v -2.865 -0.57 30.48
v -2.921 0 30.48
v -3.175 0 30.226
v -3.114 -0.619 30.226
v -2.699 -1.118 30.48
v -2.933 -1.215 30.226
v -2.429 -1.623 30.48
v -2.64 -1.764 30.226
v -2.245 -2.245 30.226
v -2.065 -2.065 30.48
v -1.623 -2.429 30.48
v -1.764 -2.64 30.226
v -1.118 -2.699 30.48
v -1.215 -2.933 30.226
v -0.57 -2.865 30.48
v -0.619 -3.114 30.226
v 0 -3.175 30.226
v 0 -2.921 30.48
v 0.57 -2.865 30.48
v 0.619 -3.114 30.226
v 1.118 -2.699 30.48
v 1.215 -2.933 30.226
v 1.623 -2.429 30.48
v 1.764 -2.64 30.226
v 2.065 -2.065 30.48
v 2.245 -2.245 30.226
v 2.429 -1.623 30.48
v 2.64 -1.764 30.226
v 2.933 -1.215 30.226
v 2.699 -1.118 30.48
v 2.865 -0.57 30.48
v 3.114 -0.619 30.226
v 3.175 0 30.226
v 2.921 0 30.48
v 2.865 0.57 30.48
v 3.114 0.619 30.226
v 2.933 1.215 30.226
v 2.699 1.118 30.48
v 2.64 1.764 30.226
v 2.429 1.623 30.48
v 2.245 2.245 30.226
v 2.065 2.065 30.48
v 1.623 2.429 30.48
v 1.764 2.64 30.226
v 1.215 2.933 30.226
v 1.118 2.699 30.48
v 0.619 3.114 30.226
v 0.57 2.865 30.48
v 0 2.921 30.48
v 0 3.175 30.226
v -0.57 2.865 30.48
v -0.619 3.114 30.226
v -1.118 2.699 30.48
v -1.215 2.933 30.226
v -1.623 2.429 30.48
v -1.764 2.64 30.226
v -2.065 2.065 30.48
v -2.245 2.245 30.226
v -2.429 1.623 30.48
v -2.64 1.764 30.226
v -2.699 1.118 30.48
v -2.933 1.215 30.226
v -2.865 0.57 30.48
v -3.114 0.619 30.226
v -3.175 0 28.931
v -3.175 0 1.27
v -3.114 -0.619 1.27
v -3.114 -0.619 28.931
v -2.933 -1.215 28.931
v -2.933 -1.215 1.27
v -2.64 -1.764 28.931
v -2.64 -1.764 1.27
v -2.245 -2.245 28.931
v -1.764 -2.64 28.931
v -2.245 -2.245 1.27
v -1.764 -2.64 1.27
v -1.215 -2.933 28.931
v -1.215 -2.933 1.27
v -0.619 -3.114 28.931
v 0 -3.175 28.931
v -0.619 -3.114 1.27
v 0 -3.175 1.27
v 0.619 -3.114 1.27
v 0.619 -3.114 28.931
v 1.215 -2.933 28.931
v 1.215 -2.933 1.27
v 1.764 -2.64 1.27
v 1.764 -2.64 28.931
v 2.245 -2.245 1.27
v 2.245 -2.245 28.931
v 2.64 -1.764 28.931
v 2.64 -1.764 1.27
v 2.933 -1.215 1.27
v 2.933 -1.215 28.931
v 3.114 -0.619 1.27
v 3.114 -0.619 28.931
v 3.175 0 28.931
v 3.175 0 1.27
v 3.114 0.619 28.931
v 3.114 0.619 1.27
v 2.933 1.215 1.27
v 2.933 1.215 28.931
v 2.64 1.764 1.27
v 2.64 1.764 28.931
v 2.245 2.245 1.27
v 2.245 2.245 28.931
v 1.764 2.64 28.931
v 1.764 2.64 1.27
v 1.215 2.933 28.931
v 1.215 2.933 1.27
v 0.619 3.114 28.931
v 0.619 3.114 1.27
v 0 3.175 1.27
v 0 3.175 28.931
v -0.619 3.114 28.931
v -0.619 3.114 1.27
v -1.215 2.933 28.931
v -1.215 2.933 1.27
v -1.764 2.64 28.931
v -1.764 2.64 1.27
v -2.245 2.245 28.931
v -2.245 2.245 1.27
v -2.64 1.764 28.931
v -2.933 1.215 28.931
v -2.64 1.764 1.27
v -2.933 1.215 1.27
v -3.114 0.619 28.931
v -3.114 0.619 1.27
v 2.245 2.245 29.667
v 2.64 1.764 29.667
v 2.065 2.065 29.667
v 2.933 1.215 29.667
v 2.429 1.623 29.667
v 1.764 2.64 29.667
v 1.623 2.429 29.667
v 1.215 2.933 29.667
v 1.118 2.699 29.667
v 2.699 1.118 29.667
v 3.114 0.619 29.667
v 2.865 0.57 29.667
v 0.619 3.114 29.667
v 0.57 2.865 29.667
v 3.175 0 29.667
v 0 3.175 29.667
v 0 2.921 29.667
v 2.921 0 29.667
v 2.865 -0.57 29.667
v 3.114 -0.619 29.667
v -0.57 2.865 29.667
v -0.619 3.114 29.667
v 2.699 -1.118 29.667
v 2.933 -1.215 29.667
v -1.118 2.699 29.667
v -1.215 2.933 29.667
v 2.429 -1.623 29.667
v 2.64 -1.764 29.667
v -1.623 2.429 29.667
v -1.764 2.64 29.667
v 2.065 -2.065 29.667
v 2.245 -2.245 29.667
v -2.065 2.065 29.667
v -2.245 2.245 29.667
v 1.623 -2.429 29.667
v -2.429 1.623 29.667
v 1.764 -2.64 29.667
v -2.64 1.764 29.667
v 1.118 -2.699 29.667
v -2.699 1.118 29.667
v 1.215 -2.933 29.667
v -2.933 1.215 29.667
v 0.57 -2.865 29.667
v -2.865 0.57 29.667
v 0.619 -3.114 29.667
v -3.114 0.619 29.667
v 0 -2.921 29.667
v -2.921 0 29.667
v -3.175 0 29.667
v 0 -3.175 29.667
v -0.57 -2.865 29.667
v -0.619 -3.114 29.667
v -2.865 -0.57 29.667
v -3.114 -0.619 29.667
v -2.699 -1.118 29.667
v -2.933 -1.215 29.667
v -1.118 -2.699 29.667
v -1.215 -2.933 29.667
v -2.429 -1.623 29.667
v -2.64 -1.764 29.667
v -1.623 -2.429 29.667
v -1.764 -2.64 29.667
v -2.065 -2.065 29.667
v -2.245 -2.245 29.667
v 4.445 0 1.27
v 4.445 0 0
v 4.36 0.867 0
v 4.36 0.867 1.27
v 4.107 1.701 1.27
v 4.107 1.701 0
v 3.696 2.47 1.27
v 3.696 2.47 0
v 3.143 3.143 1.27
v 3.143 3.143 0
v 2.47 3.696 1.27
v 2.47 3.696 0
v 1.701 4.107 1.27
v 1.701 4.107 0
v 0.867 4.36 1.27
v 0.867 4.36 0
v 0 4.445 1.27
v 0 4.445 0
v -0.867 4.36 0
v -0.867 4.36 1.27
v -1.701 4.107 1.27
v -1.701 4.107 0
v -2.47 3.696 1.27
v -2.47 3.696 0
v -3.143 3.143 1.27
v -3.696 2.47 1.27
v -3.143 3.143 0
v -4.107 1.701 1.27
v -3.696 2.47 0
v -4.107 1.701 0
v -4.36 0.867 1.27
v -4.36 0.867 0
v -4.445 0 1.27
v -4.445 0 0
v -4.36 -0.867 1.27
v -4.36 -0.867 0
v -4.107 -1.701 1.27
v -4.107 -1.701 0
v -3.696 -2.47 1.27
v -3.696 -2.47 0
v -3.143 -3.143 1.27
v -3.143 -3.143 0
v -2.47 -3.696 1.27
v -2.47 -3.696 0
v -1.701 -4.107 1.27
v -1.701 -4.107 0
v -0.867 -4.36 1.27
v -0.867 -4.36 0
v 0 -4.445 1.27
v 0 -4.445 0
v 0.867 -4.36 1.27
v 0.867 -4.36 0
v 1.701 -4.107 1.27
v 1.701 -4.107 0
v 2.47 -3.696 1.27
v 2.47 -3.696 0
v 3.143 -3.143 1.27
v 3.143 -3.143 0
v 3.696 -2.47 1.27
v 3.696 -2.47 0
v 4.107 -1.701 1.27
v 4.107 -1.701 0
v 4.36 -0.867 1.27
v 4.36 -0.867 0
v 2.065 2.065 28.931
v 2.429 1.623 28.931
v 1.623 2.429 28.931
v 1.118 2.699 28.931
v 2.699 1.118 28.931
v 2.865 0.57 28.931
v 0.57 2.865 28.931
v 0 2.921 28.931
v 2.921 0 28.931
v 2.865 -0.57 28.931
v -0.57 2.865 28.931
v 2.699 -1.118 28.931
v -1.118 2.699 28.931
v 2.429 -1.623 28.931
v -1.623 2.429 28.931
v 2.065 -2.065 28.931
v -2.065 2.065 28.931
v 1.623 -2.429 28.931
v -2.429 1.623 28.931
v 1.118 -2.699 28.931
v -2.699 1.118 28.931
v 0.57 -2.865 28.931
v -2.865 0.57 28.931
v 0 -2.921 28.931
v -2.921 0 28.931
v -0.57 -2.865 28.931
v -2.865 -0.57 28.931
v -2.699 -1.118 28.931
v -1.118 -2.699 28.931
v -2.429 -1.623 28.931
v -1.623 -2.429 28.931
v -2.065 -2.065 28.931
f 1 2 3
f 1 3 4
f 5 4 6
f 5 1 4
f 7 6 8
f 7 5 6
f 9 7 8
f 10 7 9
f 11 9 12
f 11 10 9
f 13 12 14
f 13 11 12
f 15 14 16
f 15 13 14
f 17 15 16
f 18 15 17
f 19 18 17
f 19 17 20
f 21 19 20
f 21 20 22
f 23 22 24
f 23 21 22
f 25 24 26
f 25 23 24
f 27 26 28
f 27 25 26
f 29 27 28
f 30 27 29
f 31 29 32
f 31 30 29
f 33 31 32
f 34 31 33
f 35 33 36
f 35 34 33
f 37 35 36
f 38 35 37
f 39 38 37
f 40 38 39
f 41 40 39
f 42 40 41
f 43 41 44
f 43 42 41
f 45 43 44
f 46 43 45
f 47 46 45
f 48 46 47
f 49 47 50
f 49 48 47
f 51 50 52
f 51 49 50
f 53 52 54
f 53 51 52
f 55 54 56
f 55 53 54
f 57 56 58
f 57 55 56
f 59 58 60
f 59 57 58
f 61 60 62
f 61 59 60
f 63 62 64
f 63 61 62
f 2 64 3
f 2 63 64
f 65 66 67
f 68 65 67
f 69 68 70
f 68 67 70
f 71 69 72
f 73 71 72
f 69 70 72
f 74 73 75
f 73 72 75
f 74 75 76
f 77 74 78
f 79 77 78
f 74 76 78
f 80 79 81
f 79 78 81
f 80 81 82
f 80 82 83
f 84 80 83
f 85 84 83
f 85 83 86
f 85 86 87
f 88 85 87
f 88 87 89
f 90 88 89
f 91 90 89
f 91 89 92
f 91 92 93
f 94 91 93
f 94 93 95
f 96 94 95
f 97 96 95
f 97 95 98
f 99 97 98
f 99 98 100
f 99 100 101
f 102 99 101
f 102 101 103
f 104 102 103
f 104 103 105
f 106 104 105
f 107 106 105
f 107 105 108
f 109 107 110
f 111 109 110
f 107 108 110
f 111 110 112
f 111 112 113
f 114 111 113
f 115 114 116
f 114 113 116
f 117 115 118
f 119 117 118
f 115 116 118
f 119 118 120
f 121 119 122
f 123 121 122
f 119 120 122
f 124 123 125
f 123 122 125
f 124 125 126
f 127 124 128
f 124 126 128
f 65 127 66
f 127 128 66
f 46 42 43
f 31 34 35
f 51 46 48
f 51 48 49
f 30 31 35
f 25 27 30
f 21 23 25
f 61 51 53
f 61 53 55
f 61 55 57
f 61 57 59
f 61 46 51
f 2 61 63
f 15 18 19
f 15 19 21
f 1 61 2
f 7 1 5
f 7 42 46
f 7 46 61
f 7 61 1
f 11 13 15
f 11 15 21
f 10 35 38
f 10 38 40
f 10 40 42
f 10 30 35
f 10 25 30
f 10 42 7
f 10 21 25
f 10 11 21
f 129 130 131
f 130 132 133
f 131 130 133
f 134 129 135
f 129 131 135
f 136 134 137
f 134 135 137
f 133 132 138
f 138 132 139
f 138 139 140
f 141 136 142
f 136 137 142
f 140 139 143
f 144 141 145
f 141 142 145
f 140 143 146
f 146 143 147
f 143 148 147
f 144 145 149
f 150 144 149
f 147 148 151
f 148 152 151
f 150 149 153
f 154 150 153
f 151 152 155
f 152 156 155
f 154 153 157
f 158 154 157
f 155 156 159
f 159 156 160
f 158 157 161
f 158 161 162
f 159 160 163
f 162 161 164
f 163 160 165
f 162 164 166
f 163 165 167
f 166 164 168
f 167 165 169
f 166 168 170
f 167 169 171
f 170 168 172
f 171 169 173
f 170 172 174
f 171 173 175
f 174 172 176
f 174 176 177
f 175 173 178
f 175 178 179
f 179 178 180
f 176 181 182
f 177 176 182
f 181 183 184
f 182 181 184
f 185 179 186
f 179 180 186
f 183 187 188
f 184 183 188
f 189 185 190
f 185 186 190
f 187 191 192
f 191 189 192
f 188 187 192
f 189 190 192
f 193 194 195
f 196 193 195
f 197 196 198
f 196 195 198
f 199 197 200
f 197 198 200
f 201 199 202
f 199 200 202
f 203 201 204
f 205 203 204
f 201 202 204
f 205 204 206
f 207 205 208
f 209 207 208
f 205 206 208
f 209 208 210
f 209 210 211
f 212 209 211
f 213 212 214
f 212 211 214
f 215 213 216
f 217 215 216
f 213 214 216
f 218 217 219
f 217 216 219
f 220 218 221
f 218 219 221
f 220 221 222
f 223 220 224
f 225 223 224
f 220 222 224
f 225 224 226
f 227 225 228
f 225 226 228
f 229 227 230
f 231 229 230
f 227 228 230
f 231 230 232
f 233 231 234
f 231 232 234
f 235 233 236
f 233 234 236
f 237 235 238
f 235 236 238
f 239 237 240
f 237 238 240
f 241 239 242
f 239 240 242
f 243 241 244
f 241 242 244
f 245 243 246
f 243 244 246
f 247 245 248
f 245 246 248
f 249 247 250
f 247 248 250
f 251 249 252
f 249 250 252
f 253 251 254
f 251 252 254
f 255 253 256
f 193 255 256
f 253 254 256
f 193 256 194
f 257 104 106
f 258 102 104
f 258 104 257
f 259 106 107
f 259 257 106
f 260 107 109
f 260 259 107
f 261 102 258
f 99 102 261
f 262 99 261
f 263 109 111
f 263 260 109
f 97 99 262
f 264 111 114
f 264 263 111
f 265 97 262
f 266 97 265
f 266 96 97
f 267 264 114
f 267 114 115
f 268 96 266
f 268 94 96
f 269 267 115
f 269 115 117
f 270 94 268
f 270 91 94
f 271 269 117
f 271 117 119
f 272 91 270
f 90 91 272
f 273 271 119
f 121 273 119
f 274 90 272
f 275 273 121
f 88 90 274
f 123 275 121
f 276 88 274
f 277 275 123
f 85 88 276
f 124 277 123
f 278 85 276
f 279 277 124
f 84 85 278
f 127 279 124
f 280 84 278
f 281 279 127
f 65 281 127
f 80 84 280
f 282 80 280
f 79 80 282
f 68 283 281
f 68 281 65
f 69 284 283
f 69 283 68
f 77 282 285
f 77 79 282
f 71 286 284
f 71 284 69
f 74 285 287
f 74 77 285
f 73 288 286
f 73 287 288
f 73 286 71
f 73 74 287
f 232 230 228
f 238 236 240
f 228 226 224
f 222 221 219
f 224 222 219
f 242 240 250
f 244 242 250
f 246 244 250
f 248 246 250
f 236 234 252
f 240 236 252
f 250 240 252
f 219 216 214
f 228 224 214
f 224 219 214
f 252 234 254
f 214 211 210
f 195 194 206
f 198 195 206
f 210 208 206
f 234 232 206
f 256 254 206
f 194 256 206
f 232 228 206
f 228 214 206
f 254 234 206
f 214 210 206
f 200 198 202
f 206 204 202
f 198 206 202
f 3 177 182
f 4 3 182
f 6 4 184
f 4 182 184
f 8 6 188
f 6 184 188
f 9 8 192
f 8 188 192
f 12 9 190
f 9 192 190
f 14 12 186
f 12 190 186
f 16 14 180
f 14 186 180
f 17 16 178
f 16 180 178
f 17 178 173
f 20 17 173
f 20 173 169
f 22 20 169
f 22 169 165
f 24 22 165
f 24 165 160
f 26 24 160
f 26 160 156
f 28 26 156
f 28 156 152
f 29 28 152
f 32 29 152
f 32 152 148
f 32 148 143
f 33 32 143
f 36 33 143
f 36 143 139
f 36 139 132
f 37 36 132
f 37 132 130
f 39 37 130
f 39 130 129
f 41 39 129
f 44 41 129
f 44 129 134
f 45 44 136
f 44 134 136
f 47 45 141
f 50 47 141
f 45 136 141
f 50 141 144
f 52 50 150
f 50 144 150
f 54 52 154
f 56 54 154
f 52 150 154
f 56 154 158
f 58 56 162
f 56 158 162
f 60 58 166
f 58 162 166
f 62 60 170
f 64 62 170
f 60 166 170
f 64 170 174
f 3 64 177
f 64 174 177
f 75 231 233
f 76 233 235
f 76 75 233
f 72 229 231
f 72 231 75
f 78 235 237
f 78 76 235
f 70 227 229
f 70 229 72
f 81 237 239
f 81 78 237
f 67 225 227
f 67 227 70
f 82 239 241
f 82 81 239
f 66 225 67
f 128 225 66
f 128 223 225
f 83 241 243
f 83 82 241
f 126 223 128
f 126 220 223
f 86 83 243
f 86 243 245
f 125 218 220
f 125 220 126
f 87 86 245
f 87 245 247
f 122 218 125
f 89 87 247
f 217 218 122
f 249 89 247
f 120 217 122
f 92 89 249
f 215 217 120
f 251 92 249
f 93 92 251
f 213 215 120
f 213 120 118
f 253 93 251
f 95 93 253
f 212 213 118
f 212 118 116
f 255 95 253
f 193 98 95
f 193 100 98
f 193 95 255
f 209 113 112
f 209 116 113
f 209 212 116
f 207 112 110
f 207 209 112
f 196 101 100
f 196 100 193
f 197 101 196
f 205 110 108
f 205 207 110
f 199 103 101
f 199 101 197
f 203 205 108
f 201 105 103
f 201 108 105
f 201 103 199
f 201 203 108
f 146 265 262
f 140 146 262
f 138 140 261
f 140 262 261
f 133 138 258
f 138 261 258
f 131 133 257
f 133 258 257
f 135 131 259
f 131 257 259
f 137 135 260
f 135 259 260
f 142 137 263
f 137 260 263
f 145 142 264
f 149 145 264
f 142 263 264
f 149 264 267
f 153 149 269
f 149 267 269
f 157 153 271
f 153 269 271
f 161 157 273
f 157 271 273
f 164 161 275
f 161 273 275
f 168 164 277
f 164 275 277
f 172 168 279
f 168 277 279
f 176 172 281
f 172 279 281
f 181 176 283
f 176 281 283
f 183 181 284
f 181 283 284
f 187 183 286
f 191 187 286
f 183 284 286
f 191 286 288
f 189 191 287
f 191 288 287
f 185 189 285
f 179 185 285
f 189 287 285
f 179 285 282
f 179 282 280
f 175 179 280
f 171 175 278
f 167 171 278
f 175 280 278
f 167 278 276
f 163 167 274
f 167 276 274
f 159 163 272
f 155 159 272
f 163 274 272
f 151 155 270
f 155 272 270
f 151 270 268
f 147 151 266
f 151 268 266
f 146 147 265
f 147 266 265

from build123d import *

# Parameters (mm, degrees)
SKETCH1_R           = 4.445
BOSS_EXTRUDE1_DEPTH = 1.27
SKETCH2_R           = 3.175
BOSS_EXTRUDE2_DEPTH = 29.21
CUT_EXTRUDE1_START  = -1.5494
SKETCH4_R           = 3.175
SKETCH4_R_2         = 2.921
CUT_EXTRUDE1_DEPTH  = 0.7366
CHAMFER1_SIZE       = 0.254


with BuildPart() as part:
    # Sketch1 → Boss-Extrude1 (new body)
    with BuildSketch(Plane.XY):
        Circle(SKETCH1_R)
    extrude(amount=BOSS_EXTRUDE1_DEPTH)

    # Sketch2 → Boss-Extrude2 (add)
    with BuildSketch(Plane.XY.offset(1.27)):
        with Locations(Location((0, 0, 0), (0, 0, 180))):
            Circle(SKETCH2_R)
    extrude(amount=BOSS_EXTRUDE2_DEPTH)

    # Sketch4 → Cut-Extrude1 (cut)
    with BuildSketch(Plane.XY.offset(30.48).offset(CUT_EXTRUDE1_START)):
        with Locations(Location((0, 0, 0), (0, 0, 180))):
            Circle(SKETCH4_R)
        Circle(SKETCH4_R_2, mode=Mode.SUBTRACT)
    extrude(amount=CUT_EXTRUDE1_DEPTH, mode=Mode.SUBTRACT)

    # Chamfer1
    chamfer1_edges = [part.edges().sort_by_distance(p)[0] for p in [
        (3.175, 0, 30.48),
    ]]
    chamfer(chamfer1_edges, length=CHAMFER1_SIZE)


solid = part.part
